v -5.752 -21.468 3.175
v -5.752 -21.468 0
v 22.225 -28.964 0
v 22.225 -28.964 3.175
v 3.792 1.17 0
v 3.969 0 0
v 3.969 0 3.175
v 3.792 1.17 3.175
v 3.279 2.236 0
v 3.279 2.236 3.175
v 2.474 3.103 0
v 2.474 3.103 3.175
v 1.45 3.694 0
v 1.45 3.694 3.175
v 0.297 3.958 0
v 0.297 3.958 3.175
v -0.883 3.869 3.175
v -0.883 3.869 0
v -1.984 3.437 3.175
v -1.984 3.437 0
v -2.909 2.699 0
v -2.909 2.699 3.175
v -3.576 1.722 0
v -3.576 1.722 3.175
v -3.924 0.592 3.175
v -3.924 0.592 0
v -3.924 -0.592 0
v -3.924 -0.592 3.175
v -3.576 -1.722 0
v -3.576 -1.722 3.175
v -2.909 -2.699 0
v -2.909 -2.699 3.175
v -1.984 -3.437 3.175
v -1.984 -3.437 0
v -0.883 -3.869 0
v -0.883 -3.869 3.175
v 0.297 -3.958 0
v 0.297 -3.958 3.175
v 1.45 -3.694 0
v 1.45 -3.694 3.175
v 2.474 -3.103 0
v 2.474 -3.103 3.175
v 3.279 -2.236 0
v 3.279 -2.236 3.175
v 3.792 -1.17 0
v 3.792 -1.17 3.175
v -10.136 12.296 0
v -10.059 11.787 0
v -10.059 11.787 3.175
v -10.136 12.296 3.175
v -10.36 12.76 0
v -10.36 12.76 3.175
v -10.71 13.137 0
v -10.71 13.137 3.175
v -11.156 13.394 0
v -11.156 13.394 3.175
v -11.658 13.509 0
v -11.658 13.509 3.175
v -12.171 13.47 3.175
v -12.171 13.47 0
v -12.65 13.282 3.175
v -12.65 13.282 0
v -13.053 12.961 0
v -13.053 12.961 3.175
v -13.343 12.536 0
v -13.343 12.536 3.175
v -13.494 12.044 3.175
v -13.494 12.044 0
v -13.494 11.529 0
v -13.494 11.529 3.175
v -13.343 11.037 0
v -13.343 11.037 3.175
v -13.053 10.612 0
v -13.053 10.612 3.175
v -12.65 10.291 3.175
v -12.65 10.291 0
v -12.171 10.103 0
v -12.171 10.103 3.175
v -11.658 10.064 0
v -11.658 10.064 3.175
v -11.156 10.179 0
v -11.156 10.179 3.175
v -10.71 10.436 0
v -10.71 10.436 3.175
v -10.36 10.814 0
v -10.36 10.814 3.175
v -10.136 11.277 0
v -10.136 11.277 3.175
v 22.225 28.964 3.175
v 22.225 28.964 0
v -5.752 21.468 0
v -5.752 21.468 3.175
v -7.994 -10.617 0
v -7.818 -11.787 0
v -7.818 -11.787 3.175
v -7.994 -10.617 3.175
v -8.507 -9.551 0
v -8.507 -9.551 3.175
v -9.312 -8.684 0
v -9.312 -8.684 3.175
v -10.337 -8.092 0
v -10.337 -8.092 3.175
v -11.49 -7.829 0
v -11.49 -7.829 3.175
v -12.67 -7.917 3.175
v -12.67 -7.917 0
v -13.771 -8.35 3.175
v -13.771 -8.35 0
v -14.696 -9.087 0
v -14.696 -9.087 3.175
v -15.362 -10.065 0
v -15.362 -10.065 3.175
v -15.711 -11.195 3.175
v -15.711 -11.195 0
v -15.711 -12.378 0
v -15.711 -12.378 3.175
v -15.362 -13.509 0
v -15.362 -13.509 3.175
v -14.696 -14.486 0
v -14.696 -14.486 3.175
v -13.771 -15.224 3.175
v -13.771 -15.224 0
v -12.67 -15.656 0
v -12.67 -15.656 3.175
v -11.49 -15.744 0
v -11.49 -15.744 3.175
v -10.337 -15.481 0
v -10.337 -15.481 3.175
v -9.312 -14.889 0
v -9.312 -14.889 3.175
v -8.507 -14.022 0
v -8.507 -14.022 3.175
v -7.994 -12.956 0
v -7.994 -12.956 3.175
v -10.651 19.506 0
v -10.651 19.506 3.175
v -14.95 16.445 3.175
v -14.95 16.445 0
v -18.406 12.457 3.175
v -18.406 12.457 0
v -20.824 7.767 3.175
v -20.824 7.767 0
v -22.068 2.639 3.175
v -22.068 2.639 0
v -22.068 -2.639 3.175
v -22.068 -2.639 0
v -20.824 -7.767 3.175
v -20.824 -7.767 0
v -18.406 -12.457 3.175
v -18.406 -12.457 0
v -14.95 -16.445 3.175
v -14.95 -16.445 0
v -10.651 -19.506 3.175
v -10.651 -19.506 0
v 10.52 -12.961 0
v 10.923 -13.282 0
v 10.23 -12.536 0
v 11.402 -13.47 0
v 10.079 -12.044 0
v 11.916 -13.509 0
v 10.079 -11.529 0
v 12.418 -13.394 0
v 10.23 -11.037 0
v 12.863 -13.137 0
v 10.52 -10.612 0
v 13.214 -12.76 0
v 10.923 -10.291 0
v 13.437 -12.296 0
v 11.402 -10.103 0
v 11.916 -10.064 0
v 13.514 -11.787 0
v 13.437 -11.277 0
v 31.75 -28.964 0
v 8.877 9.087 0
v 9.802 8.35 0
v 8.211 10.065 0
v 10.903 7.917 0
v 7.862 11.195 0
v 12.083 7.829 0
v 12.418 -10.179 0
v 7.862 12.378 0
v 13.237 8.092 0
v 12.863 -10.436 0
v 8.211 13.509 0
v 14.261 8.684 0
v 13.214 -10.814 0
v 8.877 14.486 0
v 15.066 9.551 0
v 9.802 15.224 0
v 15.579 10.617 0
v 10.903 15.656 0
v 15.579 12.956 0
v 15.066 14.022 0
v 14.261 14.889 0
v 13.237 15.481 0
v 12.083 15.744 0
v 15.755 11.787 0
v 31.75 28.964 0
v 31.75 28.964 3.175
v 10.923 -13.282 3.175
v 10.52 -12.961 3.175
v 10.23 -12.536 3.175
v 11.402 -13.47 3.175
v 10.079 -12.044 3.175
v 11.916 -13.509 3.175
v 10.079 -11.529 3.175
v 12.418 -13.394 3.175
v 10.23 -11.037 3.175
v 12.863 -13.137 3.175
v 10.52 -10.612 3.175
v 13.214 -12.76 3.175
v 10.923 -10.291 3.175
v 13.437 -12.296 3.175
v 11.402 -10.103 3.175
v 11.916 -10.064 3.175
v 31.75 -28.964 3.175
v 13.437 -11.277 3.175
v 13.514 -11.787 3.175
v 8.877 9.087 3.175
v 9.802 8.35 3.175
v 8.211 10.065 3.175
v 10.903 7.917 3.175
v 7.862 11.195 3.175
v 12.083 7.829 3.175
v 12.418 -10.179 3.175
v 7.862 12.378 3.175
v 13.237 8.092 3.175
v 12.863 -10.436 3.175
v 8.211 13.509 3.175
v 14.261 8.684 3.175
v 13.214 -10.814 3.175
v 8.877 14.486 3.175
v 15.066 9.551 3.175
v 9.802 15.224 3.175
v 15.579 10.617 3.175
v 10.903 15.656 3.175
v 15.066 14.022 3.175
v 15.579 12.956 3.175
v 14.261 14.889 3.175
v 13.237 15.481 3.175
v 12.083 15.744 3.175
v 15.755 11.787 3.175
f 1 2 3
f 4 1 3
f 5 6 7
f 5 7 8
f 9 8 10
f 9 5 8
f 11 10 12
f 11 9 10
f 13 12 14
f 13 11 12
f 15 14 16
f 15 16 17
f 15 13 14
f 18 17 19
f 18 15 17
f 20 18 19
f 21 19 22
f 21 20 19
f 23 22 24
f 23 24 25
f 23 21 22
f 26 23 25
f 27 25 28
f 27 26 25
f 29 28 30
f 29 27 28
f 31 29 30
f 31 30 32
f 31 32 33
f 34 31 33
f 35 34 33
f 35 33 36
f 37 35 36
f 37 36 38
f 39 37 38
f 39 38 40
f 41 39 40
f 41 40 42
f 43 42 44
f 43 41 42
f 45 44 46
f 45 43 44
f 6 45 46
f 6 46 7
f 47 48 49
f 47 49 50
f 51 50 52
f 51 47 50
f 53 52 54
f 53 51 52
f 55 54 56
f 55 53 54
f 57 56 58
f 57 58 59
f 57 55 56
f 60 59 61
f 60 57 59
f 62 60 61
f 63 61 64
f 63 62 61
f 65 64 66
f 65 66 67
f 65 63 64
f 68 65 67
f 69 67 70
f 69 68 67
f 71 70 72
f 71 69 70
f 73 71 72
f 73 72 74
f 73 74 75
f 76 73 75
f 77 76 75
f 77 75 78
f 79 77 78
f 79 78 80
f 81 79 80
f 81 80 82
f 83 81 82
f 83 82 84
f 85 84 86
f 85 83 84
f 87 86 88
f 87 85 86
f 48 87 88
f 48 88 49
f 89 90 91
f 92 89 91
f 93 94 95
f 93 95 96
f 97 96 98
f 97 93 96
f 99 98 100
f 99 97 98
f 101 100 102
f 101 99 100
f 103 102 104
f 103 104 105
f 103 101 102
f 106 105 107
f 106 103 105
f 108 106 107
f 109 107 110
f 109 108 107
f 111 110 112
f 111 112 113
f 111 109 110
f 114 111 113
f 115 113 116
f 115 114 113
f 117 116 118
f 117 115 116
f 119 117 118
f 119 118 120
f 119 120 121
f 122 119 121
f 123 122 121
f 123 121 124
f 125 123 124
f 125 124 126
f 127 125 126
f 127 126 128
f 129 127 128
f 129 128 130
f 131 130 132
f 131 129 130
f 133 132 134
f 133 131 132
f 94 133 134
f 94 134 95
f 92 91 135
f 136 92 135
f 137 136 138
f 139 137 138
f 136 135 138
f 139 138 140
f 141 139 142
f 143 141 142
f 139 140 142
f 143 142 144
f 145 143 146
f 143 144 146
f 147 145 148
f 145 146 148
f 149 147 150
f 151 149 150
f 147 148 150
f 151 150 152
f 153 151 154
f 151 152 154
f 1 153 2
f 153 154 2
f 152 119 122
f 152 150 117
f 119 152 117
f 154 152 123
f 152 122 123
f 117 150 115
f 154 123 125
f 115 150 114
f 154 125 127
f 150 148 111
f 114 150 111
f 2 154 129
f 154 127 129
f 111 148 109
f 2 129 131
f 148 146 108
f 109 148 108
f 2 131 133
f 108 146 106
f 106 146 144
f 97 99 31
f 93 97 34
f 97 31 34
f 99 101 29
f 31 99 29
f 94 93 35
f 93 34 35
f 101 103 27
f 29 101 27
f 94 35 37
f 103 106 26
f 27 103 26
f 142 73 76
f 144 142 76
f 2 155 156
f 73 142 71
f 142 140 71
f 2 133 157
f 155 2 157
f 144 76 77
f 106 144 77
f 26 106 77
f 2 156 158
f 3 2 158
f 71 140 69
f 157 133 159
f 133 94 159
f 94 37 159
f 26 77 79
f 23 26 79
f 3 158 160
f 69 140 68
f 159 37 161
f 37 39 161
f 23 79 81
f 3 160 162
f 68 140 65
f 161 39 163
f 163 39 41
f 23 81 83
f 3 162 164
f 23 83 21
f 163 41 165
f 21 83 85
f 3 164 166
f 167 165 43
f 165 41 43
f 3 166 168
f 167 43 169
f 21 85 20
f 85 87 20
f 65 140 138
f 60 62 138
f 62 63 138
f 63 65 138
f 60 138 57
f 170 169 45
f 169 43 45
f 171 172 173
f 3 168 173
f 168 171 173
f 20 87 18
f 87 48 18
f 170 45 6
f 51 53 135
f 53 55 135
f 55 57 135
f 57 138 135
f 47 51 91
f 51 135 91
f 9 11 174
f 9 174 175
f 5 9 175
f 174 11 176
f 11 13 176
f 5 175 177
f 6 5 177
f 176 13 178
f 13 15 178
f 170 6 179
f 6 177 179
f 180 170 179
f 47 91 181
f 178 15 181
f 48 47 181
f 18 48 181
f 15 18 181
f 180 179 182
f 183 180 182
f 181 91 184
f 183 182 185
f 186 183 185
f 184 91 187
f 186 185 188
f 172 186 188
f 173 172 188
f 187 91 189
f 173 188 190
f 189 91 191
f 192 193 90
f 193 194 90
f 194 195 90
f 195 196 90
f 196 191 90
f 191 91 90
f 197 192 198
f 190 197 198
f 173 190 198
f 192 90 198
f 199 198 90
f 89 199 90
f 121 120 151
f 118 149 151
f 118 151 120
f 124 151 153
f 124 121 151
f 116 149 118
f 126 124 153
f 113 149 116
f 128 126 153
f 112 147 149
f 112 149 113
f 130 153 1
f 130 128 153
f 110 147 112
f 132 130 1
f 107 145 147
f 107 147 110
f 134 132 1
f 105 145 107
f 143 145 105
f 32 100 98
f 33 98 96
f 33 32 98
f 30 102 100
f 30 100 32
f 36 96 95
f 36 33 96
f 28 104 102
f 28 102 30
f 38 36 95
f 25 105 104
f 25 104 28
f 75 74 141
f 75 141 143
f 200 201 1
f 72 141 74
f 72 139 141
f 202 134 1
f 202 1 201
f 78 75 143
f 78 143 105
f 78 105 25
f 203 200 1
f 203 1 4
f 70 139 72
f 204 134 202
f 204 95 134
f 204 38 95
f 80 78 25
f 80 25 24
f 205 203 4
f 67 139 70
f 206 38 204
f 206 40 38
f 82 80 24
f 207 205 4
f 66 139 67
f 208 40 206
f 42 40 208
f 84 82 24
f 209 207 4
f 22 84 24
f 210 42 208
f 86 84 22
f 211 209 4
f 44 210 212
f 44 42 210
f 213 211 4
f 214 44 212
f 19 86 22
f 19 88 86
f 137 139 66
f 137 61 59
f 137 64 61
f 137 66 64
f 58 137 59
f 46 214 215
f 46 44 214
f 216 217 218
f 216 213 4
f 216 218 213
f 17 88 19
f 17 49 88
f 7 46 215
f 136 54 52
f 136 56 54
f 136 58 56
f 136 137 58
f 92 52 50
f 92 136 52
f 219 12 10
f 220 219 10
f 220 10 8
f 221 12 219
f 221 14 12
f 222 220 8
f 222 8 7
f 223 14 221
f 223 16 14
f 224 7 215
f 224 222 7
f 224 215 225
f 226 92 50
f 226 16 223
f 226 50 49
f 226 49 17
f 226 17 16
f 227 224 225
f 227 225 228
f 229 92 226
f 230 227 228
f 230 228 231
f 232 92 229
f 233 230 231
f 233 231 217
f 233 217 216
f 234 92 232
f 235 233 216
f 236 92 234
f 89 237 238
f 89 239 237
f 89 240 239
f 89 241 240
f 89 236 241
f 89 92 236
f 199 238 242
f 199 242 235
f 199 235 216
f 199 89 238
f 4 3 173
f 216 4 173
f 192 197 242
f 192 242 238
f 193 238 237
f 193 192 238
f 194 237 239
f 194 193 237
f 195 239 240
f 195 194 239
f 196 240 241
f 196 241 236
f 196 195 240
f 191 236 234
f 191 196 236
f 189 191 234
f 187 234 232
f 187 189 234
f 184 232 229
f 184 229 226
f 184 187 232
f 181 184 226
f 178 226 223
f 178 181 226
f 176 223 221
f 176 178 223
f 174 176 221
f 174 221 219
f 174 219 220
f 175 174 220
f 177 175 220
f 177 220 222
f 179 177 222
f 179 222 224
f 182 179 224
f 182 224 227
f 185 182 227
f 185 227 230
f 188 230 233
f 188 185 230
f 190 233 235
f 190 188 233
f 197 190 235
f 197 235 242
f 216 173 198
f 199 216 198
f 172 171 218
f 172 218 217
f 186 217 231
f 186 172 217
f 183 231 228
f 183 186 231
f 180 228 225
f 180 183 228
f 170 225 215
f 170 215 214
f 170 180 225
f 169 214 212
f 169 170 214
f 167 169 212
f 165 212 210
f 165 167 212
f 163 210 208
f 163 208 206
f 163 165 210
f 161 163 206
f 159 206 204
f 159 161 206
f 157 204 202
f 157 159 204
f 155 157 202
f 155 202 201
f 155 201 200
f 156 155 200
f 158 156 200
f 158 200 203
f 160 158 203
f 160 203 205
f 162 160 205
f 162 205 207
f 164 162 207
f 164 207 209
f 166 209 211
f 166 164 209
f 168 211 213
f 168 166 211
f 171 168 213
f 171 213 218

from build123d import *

# Parameters (mm, degrees)
F0_R     = 3.96875
F0_R_2   = 1.7272
F1_DEPTH = 3.175


with BuildPart() as f1:
    # F0 (on Top) → F1 (new body)
    with BuildSketch(Plane.XY):
        with BuildLine():
            Line((31.75, 28.964184), (22.225, 28.964184))
            Line((22.225, 28.964184), (-5.752253, 21.467701))
            ThreePointArc((-5.752253, 21.467701), (-22.225, 0), (-5.752253, -21.467701))
            Line((-5.752253, -21.467701), (22.225, -28.964184))
            Line((22.225, -28.964184), (31.75, -28.964184))
            Line((31.75, -28.964184), (31.75, 28.964184))
        make_face()
        with Locations((-11.786586, -11.786586)):
            Circle(F0_R, mode=Mode.SUBTRACT)
        with Locations((11.786586, -11.786586)):
            Circle(F0_R_2, mode=Mode.SUBTRACT)
        with Locations((-11.786586, 11.786586)):
            Circle(F0_R_2, mode=Mode.SUBTRACT)
        Circle(F0_R, mode=Mode.SUBTRACT)
        with Locations((11.786586, 11.786586)):
            Circle(F0_R, mode=Mode.SUBTRACT)
    extrude(amount=F1_DEPTH)


solid = f1.part
